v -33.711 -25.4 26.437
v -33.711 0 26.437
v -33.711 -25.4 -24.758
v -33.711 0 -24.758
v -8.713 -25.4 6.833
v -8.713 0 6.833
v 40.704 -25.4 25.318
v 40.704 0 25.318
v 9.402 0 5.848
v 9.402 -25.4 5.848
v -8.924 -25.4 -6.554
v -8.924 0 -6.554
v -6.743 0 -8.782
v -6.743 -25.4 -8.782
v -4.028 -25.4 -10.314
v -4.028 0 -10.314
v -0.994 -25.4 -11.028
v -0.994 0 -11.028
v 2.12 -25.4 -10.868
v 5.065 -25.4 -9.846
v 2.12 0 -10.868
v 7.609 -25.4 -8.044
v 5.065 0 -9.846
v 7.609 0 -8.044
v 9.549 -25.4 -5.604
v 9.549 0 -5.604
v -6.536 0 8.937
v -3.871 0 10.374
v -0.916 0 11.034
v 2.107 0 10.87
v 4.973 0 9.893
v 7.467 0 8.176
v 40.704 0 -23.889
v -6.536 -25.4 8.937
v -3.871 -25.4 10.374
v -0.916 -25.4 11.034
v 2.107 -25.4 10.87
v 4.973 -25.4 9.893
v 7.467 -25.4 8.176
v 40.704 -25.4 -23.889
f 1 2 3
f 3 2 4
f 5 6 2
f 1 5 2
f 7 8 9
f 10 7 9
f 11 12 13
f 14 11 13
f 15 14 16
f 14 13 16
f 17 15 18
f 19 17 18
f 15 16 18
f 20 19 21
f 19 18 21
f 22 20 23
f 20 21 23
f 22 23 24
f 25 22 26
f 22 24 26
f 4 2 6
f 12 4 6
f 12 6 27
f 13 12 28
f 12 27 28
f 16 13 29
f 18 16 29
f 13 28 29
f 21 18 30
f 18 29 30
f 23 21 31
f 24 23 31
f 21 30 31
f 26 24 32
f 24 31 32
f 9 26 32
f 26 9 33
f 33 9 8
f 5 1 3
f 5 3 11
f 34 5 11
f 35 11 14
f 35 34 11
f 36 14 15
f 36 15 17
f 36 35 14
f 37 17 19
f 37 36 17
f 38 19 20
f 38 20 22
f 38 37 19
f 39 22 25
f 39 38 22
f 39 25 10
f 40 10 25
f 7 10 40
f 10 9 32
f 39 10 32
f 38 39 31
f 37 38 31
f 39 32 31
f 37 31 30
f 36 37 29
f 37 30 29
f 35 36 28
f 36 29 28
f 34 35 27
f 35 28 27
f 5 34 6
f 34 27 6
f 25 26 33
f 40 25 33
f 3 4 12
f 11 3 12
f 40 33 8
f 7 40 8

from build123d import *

# Parameters (mm, degrees)
F1_DEPTH = 25.4


with BuildPart() as f1:
    # F0 (on Front) → F1 (new body)
    with BuildSketch(Plane.XZ):
        with BuildLine():
            Line((40.7043881714, -23.8888029385), (40.7043881714, 25.317851454))
            Line((40.7043881714, 25.317851454), (9.4020965094, 5.8480398177))
            ThreePointArc((9.4020965094, 5.8480398177), (10.6466699917, 3.0409548779), (11.0724427513, 0))
            ThreePointArc((11.0724427513, 0), (10.6848861314, -2.9038245196), (9.5493467137, -5.6043702432))
            Line((9.5493467137, -5.6043702432), (40.7043881714, -23.8888029385))
        make_face()
        with BuildLine():
            ThreePointArc((11.0724427513, 0), (10.6466699917, 3.0409548779), (9.4020965094, 5.8480398177))
            Line((9.4020965094, 5.8480398177), (0, 0))
            Line((0, 0), (9.5493467137, -5.6043702432))
            ThreePointArc((9.5493467137, -5.6043702432), (10.6848861314, -2.9038245196), (11.0724427513, 0))
        make_face()
        with BuildLine():
            Line((0, 0), (9.4020965094, 5.8480398177))
            ThreePointArc((9.4020965094, 5.8480398177), (0.6010385922, 11.0561178128), (-8.7127334808, 6.8328078982))
            Line((-8.7127334808, 6.8328078982), (0, 0))
        make_face()
        with BuildLine():
            ThreePointArc((-8.9241617805, -6.5542600647), (0.5685830796, -11.0578344065), (9.5493467137, -5.6043702432))
            Line((9.5493467137, -5.6043702432), (0, 0))
            Line((0, 0), (-8.9241617805, -6.5542600647))
        make_face()
        with BuildLine():
            Line((-8.9241617805, -6.5542600647), (0, 0))
            Line((0, 0), (-8.7127334808, 6.8328078982))
            ThreePointArc((-8.7127334808, 6.8328078982), (-11.0710620889, 0.1748505229), (-8.9241617805, -6.5542600647))
        make_face()
        with BuildLine():
            ThreePointArc((-8.9241617805, -6.5542600647), (-11.0710620889, 0.1748505229), (-8.7127334808, 6.8328078982))
            Line((-8.7127334808, 6.8328078982), (-33.7105058134, 26.4368709177))
            Line((-33.7105058134, 26.4368709177), (-33.7105058134, -24.7583389282))
            Line((-33.7105058134, -24.7583389282), (-8.9241617805, -6.5542600647))
        make_face()
    extrude(amount=F1_DEPTH)


solid = f1.part
